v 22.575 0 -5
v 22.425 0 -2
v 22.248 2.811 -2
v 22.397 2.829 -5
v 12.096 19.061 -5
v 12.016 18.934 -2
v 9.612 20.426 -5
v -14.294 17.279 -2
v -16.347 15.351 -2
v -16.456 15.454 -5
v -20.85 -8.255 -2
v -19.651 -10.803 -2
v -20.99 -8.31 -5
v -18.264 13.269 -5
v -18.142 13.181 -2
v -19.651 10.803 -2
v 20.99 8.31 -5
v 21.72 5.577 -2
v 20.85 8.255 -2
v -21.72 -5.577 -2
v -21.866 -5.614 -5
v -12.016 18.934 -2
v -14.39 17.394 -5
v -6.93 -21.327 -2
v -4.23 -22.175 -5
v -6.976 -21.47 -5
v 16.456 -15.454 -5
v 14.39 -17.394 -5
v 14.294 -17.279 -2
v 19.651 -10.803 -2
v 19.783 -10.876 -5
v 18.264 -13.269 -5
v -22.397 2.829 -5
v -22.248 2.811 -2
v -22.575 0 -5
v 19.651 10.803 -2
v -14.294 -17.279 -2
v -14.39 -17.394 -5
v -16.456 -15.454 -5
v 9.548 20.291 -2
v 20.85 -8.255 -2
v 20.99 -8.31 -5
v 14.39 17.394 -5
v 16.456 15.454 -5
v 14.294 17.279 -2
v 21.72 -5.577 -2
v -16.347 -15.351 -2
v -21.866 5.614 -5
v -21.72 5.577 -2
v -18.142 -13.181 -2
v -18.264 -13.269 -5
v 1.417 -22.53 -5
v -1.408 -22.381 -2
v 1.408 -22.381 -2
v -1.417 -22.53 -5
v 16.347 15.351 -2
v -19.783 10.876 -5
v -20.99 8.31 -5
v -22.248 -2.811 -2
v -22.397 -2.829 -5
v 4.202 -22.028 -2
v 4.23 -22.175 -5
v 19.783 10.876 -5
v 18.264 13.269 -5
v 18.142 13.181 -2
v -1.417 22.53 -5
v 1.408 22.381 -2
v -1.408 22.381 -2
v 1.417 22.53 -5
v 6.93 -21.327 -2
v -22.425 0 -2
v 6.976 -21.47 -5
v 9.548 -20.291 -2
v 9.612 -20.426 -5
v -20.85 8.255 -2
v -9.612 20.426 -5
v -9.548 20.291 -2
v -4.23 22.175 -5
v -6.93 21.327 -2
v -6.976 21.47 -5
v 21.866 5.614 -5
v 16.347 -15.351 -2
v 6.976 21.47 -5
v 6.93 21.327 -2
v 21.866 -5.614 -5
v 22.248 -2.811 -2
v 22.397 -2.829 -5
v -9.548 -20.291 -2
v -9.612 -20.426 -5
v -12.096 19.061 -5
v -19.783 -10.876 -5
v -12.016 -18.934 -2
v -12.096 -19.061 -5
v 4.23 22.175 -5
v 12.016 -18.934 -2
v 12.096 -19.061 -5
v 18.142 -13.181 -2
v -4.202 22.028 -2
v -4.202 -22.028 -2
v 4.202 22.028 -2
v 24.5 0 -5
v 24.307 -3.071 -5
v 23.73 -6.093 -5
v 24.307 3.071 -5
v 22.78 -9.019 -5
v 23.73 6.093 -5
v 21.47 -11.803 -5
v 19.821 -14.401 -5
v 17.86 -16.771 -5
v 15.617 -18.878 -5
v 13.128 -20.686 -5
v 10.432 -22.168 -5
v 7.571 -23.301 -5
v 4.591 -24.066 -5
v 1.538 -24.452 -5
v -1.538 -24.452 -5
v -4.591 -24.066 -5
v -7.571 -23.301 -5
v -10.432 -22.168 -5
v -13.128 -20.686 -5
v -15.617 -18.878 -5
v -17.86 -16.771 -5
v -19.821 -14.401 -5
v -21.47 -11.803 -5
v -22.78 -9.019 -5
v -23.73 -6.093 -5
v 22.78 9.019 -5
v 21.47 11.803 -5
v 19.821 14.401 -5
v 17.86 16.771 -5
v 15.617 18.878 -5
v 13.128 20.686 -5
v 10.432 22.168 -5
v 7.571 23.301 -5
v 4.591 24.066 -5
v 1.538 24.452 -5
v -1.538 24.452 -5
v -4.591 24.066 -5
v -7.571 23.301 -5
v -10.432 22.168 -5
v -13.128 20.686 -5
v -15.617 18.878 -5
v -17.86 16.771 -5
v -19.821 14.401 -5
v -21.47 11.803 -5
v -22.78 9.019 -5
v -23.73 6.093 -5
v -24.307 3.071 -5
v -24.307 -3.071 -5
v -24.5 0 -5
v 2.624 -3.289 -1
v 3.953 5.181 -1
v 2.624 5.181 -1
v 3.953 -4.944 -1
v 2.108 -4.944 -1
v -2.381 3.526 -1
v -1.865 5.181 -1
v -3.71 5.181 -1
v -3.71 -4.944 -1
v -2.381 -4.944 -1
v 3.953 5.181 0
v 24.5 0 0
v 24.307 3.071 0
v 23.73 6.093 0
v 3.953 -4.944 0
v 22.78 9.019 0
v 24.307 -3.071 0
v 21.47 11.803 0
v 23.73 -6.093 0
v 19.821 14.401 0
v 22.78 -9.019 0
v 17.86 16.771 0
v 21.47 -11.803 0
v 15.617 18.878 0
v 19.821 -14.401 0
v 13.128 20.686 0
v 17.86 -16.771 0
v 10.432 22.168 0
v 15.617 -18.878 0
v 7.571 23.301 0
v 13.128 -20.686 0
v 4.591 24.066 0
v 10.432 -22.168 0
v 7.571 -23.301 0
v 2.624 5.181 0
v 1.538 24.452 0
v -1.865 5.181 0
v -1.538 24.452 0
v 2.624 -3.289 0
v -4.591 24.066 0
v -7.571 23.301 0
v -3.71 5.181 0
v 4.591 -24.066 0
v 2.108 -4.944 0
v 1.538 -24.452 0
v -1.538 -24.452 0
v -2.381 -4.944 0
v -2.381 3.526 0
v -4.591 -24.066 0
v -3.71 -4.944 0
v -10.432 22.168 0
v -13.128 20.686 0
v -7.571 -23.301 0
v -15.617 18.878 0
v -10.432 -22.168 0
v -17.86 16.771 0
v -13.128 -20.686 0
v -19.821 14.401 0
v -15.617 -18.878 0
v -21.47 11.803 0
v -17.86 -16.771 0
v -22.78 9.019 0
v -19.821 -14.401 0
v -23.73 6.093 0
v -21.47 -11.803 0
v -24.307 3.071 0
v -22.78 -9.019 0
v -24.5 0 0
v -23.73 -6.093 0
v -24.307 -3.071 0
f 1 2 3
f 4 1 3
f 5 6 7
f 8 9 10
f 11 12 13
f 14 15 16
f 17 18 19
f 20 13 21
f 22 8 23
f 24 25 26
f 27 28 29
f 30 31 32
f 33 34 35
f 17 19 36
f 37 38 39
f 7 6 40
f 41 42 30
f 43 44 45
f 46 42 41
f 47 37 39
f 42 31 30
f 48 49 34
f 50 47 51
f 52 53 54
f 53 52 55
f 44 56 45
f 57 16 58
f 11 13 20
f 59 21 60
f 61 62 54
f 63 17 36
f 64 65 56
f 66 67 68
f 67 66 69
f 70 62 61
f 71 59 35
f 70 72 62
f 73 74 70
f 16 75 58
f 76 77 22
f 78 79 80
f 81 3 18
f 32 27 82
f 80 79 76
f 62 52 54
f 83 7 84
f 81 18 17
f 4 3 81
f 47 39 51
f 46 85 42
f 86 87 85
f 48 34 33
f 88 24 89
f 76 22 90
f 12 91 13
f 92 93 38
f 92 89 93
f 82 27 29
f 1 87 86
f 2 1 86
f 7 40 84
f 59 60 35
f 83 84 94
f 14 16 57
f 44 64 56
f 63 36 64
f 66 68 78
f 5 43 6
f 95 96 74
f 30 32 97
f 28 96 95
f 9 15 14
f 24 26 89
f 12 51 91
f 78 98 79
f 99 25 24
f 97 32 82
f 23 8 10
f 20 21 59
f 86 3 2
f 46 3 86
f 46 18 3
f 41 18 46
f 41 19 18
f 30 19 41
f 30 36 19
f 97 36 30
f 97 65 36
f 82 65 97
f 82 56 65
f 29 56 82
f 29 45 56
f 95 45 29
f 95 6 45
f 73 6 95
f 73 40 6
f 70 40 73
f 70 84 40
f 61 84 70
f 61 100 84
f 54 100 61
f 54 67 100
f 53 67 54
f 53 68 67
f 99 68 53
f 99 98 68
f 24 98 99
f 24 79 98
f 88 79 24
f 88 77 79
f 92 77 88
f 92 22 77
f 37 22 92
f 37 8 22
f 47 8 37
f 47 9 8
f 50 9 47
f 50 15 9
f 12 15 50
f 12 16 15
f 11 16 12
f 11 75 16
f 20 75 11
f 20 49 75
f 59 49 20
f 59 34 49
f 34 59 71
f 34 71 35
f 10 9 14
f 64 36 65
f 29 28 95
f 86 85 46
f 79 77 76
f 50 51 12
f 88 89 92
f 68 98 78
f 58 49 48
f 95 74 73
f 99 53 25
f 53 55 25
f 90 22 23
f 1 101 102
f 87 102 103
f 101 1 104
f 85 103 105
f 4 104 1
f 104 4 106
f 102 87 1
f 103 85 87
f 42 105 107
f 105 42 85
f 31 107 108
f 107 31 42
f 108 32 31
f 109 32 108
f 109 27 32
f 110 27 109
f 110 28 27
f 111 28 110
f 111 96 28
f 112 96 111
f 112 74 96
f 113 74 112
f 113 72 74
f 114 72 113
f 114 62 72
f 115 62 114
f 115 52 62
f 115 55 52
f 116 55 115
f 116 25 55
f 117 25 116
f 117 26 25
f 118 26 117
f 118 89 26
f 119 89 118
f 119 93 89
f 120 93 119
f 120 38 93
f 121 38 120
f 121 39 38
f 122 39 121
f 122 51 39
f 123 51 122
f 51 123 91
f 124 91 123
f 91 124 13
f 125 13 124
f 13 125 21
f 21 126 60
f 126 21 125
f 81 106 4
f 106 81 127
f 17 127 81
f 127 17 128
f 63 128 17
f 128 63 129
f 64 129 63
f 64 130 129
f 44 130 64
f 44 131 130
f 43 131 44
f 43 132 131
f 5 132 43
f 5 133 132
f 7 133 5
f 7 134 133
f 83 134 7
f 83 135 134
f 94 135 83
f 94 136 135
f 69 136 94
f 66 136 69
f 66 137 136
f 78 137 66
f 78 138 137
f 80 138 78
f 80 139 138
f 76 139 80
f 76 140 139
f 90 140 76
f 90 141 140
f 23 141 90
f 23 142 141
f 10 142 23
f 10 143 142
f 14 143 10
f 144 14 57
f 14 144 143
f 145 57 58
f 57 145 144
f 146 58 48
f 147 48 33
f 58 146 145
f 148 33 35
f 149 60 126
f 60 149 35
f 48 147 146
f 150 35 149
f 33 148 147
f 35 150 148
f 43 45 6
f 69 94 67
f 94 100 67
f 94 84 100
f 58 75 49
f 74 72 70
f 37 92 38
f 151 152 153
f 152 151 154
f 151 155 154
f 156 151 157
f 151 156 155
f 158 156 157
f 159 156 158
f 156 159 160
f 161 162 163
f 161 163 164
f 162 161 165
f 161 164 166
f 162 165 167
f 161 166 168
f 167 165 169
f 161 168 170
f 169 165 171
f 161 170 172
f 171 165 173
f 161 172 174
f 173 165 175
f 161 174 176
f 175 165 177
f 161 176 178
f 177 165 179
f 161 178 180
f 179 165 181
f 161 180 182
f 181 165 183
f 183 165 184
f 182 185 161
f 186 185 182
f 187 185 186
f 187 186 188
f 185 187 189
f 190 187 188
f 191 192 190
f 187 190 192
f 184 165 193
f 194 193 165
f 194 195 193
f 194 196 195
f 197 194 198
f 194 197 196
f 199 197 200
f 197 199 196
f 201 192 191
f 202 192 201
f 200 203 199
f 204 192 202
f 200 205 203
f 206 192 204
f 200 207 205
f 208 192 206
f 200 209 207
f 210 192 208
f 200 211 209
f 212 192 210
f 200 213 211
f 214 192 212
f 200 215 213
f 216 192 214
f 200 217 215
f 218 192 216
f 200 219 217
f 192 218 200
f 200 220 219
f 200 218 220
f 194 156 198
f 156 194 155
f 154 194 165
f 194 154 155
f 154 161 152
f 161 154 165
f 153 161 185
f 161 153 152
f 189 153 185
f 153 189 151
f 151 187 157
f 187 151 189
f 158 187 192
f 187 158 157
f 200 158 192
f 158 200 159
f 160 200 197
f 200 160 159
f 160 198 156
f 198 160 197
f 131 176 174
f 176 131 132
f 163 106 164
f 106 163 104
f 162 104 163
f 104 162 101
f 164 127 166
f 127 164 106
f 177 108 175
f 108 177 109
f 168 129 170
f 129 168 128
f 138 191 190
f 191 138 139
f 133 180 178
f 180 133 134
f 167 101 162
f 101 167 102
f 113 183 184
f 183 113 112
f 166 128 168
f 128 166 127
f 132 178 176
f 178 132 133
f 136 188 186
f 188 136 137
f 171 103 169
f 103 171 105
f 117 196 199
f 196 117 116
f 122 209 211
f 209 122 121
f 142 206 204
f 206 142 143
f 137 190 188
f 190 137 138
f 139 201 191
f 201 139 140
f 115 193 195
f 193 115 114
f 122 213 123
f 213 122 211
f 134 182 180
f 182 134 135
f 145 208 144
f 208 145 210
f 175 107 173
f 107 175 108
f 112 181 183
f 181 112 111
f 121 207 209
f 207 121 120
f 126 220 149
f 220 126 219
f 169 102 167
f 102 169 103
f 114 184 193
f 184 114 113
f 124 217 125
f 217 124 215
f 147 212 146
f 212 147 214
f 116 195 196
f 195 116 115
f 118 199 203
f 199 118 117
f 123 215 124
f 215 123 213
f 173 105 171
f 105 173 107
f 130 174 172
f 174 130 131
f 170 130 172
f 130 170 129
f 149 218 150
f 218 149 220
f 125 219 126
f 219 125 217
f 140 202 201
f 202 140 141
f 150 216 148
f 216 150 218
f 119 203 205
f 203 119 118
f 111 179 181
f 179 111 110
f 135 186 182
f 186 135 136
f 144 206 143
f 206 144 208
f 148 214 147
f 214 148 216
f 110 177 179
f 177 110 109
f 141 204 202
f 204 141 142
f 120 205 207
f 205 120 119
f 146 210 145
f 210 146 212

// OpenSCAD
$fn = 50;


difference() {
	union() {
		translate(v = [0, 0, -5.0000000000]) {
			cylinder(h = 5, r = 24.5000000000);
		}
	}
	union() {
		#translate(v = [0, 0, -5.0000000000]) {
			cylinder(h = 3, r1 = 22.5750000000, r2 = 22.4250000000);
		}
		translate(v = [0, 0, -1]) {
			linear_extrude(height = 1) {
				text(font = "Impact", halign = "center", size = 10, text = "N", valign = "center");
			}
		}
	}
}
